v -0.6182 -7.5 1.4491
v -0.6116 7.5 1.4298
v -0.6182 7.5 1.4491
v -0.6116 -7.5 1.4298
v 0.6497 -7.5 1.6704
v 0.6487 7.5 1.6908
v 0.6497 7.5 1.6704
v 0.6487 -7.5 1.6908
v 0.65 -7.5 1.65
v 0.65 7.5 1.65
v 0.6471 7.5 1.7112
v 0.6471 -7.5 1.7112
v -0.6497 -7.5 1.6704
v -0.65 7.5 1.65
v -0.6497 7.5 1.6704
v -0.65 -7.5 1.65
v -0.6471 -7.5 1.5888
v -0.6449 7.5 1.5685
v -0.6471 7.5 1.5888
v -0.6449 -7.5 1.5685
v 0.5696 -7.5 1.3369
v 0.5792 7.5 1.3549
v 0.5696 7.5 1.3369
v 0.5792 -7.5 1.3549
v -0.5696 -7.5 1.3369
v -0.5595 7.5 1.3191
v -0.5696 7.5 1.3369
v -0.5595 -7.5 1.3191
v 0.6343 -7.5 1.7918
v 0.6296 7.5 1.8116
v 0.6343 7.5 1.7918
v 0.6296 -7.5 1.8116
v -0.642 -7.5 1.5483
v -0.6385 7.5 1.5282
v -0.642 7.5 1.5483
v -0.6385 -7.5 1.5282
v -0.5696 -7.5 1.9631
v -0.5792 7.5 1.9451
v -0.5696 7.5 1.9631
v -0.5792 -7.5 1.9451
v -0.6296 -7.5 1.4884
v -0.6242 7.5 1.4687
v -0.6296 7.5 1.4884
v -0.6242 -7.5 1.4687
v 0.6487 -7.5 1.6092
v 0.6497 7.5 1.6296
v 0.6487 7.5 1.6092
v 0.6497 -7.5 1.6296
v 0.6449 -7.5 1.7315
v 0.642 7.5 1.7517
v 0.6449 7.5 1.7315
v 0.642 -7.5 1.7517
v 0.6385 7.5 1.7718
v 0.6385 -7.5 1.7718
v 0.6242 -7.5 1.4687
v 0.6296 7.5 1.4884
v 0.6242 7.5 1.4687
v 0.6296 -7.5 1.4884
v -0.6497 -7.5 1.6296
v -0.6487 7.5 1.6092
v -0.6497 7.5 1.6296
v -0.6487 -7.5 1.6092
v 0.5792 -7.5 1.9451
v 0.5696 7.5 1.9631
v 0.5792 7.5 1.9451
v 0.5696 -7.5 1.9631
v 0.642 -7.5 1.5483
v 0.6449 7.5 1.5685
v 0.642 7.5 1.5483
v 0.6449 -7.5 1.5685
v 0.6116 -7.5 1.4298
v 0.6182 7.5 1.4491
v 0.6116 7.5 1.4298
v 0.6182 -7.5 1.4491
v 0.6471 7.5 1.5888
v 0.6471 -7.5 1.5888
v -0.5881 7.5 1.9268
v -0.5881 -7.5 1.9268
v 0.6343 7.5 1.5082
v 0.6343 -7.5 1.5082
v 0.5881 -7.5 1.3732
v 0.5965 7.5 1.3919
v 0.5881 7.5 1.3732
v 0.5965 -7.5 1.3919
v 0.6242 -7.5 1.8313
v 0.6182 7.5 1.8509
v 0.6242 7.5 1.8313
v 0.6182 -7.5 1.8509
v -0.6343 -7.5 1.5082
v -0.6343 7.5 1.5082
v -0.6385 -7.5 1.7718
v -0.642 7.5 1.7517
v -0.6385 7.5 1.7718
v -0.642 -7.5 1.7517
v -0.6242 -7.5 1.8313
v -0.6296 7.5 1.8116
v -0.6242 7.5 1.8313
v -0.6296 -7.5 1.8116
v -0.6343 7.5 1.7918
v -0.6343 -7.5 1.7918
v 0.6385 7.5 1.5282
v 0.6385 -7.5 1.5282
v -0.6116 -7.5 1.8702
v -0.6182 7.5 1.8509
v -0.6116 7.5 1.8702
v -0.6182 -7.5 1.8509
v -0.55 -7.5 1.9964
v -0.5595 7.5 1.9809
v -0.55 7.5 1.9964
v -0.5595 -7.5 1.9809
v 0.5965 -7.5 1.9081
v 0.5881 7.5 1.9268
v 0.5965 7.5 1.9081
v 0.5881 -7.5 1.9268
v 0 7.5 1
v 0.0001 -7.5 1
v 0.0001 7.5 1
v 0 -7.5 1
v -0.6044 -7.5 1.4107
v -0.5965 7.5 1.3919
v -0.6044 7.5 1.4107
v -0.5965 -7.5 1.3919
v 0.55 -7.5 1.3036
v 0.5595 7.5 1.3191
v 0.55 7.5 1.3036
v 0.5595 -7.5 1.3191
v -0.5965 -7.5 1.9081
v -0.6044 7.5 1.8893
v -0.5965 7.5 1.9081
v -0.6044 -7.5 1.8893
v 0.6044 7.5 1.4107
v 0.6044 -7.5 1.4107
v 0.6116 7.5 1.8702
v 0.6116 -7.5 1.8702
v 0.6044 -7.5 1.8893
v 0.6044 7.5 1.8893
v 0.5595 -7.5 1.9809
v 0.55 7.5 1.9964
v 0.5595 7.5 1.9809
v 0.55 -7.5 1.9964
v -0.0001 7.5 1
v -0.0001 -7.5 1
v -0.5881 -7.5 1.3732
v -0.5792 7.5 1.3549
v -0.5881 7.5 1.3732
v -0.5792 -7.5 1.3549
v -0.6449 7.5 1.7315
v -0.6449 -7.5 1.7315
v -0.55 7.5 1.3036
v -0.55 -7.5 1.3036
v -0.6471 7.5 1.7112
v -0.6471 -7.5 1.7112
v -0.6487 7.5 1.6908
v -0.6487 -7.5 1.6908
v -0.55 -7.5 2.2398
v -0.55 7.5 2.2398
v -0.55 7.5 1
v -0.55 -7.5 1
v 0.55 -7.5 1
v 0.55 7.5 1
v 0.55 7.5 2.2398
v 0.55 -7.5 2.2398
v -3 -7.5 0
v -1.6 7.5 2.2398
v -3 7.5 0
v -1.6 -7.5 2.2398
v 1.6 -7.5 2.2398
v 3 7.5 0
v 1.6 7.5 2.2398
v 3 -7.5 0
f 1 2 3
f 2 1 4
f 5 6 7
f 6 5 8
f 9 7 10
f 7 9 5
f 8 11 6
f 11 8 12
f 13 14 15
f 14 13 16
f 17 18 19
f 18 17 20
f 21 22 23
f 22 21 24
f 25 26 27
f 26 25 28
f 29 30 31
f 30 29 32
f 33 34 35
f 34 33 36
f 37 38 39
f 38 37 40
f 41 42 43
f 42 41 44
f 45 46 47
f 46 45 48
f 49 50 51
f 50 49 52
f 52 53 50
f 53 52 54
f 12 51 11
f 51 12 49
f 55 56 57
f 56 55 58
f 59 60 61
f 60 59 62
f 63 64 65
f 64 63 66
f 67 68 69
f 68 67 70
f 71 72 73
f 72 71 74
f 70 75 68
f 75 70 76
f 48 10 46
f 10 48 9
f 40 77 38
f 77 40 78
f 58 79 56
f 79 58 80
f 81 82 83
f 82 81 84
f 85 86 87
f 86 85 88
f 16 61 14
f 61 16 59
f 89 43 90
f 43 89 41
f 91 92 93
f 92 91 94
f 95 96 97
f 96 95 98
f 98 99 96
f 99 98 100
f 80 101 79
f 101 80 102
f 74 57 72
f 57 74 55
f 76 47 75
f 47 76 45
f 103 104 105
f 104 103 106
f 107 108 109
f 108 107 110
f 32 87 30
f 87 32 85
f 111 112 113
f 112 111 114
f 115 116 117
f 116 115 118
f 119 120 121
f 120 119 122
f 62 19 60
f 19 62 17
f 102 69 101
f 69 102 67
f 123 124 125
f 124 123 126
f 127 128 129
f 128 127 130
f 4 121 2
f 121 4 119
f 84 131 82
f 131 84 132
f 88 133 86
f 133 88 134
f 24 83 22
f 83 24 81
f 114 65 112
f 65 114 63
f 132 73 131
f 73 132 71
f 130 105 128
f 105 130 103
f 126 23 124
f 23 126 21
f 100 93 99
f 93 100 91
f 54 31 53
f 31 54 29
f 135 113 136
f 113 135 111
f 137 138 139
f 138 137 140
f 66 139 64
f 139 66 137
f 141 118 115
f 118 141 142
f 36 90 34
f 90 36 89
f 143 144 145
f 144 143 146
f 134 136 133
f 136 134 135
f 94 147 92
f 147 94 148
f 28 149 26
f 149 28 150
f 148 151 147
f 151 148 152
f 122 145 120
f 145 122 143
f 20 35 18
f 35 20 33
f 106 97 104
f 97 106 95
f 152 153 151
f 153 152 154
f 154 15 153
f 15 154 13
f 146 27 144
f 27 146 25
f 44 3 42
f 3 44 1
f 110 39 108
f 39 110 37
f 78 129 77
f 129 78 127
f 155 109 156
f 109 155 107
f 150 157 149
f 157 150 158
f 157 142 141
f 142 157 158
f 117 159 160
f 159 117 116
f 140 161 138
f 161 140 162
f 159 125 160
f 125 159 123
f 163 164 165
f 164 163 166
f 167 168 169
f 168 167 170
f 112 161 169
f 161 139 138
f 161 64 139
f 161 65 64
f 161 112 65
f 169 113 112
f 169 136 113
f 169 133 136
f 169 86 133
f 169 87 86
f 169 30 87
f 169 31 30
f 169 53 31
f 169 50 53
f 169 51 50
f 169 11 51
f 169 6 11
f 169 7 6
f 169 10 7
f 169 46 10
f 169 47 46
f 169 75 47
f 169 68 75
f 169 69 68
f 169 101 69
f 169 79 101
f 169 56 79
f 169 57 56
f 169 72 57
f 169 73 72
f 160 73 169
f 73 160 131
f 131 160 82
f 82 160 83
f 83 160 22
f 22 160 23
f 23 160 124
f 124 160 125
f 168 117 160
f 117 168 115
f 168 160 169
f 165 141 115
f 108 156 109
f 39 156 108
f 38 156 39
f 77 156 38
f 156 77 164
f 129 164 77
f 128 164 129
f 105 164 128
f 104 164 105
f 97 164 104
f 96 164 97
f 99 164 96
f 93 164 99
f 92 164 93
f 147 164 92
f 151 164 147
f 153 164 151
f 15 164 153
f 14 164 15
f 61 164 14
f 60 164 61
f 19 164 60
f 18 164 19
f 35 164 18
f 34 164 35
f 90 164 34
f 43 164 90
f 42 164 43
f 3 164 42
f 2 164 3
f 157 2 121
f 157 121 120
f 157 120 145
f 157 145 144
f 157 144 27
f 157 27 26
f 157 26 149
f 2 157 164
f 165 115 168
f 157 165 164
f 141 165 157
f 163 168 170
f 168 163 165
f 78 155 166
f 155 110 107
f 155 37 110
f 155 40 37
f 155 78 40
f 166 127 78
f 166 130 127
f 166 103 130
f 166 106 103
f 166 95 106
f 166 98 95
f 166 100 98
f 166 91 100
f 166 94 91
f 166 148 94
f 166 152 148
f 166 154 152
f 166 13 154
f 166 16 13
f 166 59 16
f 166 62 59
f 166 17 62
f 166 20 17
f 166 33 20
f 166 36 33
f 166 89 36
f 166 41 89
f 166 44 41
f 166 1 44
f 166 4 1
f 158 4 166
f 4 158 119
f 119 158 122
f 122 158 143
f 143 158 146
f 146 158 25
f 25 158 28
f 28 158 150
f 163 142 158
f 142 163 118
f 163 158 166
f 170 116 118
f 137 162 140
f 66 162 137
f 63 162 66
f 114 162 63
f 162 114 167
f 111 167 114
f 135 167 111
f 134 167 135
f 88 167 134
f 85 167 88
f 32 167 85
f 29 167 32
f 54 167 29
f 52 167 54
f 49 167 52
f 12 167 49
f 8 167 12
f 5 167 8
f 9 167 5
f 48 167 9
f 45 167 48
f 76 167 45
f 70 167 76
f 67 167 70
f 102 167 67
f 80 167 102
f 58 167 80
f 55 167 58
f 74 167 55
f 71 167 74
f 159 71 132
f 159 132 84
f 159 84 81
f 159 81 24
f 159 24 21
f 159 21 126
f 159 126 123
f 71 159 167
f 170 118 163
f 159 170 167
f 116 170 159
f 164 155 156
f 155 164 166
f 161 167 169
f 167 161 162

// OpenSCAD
// if you want to lable multiple cables approximate this
cable_diameter = 1.2;
// use this for ribbon cables
number_of_cables = 1;
// adjusts to the diameter if to small
label_width = 6;
label_length = 15;
// make this a little bit smaller than your diameter, if you use multiple cables make this smaller than a single cable diameter
opening_width = 1.1;
// creater value -> more space for the cable
inner_spacing = 0.05;
wall_thickness = 1;
floor_thickness = 1;
top_thickness = 0.4;

/* [Hidden] */
layout = "line"; // [1:Line ,pyramind:Pyramid]
radius = cable_diameter / 2;
padded_radius = radius + inner_spacing;
clamp_width = (cable_diameter - opening_width) / 2;
r_cos = radius - clamp_width;
r_sin = sqrt(radius*radius - r_cos * r_cos);
floor_end_to_top_start = (number_of_cables-1)*cable_diameter + radius + r_sin;
height = floor_thickness + floor_end_to_top_start + top_thickness;
top_width = cable_diameter + 2 * wall_thickness;

if(label_width < top_width) {
    label(top_width);
} else {
    label(label_width);
}

module label(working_label_width){
    translate([0, label_length/2, 0]){
        rotate([90,0,0]){            
            complete_label(working_label_width);
        }
    }           
}

module complete_label(working_label_width){
    difference(){
        main_body(working_label_width);
        cutouts(working_label_width);
    }
}

module main_body(working_label_width){
    a = [working_label_width/2, 0];
    b = [top_width/2, height];
    c = [0, height];
    linear_extrude(label_length){
        polygon([[0,0],a,b,c]);
        mirror([1,0,0]) polygon([[0,0],a,b,c]);
    }  
}

module cutouts(working_label_width){
    union(){
        cable_cut_outs(working_label_width);
        opening_cut_out(working_label_width);
    }
}

module cable_cut_outs(){
    if(layout == "line"){    
        for (k = [0 : number_of_cables-1]){
            y = floor_thickness + padded_radius + k*cable_diameter;
            cable_cut_out(0,y);
        }       
    }    
}

module cable_cut_out(x, y){
    translate([x, y, label_length/2]){
        cylinder(h = label_length+1, r = padded_radius, center= true, $fn=200);
    }    
}

module opening_cut_out(working_label_width){
    cutout_height = height - floor_thickness + 1;
    c1 = [0, floor_thickness];
    c2 = [opening_width/2, floor_thickness];
    c3 = [opening_width/2, height];
    c4 = [opening_width/2, height+1];
    c4 = [0, height+1];
    translate([0,0,-0.5]){
        linear_extrude(label_length+1){
            polygon([c1,c2,c3,c4]);
            mirror([1,0,0]) polygon([c1,c2,c3,c4]);
        } 
    }
}
    
    
